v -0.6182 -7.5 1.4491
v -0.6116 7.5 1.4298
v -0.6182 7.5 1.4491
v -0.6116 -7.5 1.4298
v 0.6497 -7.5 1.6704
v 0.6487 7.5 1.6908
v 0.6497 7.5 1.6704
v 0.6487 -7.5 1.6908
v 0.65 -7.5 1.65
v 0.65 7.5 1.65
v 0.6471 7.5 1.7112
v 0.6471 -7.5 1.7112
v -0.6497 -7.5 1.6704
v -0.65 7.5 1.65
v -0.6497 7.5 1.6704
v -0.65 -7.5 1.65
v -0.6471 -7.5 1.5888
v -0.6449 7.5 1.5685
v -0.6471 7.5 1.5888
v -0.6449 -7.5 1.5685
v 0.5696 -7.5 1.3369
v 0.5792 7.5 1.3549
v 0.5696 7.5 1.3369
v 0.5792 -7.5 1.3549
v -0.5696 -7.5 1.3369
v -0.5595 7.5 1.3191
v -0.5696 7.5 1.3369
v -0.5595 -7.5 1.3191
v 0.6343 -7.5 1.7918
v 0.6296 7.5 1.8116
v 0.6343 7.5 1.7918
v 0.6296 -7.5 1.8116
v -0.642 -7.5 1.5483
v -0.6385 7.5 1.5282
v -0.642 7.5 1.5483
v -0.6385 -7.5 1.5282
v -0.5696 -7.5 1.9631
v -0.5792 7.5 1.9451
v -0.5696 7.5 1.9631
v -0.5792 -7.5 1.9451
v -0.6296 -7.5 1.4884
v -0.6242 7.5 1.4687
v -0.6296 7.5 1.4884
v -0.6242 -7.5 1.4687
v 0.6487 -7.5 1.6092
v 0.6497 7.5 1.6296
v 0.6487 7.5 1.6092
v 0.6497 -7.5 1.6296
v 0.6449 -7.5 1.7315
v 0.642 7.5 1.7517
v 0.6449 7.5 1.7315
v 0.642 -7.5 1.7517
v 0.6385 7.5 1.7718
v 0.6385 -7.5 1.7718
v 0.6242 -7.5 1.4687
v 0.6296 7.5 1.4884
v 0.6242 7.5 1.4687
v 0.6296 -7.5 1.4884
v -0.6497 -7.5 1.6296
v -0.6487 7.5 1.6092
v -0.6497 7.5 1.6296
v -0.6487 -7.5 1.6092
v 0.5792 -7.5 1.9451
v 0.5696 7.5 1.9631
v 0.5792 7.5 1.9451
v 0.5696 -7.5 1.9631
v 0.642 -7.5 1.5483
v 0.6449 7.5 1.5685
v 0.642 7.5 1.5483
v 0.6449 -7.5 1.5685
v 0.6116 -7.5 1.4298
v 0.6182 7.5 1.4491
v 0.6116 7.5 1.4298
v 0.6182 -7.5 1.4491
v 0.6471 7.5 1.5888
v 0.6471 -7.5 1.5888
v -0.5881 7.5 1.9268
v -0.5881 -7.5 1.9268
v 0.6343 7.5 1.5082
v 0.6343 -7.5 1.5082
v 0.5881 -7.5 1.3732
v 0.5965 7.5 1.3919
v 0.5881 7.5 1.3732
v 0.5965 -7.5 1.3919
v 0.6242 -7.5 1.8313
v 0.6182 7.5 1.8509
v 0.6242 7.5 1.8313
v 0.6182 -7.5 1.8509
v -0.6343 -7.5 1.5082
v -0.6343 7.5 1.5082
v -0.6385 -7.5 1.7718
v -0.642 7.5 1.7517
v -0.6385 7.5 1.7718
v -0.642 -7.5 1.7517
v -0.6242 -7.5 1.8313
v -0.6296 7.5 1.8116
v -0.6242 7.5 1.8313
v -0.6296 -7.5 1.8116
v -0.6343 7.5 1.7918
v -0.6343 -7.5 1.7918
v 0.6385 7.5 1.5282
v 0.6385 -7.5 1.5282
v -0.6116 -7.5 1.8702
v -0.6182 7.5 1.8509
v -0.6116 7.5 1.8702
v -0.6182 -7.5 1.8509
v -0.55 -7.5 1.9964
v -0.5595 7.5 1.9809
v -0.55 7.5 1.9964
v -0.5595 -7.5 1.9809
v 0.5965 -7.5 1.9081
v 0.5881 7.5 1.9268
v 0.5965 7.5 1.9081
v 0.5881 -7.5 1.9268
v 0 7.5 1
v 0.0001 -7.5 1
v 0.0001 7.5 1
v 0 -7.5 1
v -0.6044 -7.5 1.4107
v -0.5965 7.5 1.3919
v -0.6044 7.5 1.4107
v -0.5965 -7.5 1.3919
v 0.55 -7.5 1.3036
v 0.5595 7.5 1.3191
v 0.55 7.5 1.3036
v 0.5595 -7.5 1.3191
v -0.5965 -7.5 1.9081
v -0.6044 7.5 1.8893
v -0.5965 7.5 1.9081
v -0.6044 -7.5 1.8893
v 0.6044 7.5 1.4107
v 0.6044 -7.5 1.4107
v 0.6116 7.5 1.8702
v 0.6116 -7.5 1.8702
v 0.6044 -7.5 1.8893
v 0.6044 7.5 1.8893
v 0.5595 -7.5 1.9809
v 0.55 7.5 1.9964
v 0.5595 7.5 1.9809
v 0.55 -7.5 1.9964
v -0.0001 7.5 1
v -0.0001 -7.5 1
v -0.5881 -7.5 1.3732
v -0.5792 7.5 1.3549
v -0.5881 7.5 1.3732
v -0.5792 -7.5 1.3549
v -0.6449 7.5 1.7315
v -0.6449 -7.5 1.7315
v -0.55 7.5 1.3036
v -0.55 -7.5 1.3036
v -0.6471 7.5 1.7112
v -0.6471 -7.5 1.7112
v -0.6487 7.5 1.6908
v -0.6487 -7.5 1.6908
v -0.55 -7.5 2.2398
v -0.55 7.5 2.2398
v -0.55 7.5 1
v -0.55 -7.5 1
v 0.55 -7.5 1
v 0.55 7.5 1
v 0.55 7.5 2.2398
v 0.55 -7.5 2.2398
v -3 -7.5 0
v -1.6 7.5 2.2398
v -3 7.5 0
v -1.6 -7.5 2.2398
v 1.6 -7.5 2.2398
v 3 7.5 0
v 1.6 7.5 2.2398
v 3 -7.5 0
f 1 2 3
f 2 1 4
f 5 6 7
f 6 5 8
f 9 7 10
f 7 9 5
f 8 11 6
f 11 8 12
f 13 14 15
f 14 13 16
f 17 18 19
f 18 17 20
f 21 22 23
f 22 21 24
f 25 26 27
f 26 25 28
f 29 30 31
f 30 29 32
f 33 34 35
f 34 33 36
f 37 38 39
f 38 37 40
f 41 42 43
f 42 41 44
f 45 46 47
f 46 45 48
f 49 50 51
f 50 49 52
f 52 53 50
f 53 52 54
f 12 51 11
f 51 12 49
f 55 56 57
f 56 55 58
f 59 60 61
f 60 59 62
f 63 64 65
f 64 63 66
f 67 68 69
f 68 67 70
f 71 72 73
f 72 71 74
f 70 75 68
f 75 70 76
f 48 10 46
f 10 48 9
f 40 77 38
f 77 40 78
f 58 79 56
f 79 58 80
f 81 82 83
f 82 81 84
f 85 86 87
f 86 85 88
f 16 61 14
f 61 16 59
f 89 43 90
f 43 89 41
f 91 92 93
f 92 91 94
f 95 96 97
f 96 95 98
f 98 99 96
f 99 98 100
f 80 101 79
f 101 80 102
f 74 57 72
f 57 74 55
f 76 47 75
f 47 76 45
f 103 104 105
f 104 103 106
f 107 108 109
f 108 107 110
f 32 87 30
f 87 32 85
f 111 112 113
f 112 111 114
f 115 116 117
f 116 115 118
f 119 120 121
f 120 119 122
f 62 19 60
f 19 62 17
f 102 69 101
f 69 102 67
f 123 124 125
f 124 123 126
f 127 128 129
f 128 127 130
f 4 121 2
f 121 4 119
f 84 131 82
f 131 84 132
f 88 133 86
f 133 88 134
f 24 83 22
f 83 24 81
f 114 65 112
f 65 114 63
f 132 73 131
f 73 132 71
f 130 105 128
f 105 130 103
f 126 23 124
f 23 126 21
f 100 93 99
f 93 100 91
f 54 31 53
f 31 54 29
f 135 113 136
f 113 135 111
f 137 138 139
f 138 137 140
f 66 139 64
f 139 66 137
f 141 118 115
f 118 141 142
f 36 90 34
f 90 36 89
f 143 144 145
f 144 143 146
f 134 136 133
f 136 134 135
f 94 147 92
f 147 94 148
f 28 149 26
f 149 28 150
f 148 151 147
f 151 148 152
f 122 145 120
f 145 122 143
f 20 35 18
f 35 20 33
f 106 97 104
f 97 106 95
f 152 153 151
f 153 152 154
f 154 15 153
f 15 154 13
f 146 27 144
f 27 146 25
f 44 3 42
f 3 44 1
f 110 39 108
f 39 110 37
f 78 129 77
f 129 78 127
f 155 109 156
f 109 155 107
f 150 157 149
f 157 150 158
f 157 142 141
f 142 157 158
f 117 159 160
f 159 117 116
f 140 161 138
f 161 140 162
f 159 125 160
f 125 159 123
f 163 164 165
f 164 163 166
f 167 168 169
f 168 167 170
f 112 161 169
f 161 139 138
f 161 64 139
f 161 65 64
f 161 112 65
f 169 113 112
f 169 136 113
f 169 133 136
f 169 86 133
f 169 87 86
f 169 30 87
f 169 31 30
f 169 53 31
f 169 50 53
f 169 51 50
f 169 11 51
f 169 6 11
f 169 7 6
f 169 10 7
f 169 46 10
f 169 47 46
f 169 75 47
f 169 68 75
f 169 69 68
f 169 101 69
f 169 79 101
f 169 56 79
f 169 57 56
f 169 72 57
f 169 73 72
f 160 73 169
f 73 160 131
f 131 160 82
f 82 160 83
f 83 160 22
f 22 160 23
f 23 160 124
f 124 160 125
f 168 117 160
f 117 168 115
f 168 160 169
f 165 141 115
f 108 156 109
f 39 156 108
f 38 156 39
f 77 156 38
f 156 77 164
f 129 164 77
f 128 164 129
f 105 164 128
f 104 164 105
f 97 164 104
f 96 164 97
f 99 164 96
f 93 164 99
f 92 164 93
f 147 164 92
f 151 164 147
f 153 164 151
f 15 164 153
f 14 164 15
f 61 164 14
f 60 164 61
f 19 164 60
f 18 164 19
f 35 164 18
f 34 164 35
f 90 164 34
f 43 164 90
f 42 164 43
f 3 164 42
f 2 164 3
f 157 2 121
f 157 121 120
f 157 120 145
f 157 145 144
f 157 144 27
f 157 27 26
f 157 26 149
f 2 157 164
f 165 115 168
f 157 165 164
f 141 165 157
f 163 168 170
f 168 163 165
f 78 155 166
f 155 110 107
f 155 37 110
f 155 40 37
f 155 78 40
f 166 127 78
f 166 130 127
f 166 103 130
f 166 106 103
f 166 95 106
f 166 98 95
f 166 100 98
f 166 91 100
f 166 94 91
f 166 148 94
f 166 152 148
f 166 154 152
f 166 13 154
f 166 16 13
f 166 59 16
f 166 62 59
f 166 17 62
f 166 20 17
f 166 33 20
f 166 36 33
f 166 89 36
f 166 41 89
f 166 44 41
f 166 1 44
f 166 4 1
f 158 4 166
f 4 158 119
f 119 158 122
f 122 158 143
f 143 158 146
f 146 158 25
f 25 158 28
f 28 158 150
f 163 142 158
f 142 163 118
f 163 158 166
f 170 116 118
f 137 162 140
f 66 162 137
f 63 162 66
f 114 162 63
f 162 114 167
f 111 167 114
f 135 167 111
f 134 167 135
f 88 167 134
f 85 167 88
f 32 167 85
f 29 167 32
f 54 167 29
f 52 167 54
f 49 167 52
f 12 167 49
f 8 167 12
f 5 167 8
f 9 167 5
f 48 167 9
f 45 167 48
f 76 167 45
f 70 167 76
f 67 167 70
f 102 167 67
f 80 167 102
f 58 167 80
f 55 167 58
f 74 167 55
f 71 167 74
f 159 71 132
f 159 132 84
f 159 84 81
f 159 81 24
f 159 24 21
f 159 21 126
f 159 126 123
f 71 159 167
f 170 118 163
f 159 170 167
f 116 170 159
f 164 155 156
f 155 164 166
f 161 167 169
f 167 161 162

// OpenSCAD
// if you want to lable multiple cables approximate this
cable_diameter = 1.2;
// use this for ribbon cables
number_of_cables = 1;
// adjusts to the diameter if to small
label_width = 6;
label_length = 15;
// make this a little bit smaller than your diameter, if you use multiple cables make this smaller than a single cable diameter
opening_width = 1.1;
// creater value -> more space for the cable
inner_spacing = 0.05;
wall_thickness = 1;
floor_thickness = 1;
top_thickness = 0.4;

/* [Hidden] */
layout = "line"; // [1:Line ,pyramind:Pyramid]
radius = cable_diameter / 2;
padded_radius = radius + inner_spacing;
clamp_width = (cable_diameter - opening_width) / 2;
r_cos = radius - clamp_width;
r_sin = sqrt(radius*radius - r_cos * r_cos);
floor_end_to_top_start = (number_of_cables-1)*cable_diameter + radius + r_sin;
height = floor_thickness + floor_end_to_top_start + top_thickness;
top_width = cable_diameter + 2 * wall_thickness;

if(label_width < top_width) {
    label(top_width);
} else {
    label(label_width);
}

module label(working_label_width){
    translate([0, label_length/2, 0]){
        rotate([90,0,0]){            
            complete_label(working_label_width);
        }
    }           
}

module complete_label(working_label_width){
    difference(){
        main_body(working_label_width);
        cutouts(working_label_width);
    }
}

module main_body(working_label_width){
    a = [working_label_width/2, 0];
    b = [top_width/2, height];
    c = [0, height];
    linear_extrude(label_length){
        polygon([[0,0],a,b,c]);
        mirror([1,0,0]) polygon([[0,0],a,b,c]);
    }  
}

module cutouts(working_label_width){
    union(){
        cable_cut_outs(working_label_width);
        opening_cut_out(working_label_width);
    }
}

module cable_cut_outs(){
    if(layout == "line"){    
        for (k = [0 : number_of_cables-1]){
            y = floor_thickness + padded_radius + k*cable_diameter;
            cable_cut_out(0,y);
        }       
    }    
}

module cable_cut_out(x, y){
    translate([x, y, label_length/2]){
        cylinder(h = label_length+1, r = padded_radius, center= true, $fn=200);
    }    
}

module opening_cut_out(working_label_width){
    cutout_height = height - floor_thickness + 1;
    c1 = [0, floor_thickness];
    c2 = [opening_width/2, floor_thickness];
    c3 = [opening_width/2, height];
    c4 = [opening_width/2, height+1];
    c4 = [0, height+1];
    translate([0,0,-0.5]){
        linear_extrude(label_length+1){
            polygon([c1,c2,c3,c4]);
            mirror([1,0,0]) polygon([c1,c2,c3,c4]);
        } 
    }
}
    
    
